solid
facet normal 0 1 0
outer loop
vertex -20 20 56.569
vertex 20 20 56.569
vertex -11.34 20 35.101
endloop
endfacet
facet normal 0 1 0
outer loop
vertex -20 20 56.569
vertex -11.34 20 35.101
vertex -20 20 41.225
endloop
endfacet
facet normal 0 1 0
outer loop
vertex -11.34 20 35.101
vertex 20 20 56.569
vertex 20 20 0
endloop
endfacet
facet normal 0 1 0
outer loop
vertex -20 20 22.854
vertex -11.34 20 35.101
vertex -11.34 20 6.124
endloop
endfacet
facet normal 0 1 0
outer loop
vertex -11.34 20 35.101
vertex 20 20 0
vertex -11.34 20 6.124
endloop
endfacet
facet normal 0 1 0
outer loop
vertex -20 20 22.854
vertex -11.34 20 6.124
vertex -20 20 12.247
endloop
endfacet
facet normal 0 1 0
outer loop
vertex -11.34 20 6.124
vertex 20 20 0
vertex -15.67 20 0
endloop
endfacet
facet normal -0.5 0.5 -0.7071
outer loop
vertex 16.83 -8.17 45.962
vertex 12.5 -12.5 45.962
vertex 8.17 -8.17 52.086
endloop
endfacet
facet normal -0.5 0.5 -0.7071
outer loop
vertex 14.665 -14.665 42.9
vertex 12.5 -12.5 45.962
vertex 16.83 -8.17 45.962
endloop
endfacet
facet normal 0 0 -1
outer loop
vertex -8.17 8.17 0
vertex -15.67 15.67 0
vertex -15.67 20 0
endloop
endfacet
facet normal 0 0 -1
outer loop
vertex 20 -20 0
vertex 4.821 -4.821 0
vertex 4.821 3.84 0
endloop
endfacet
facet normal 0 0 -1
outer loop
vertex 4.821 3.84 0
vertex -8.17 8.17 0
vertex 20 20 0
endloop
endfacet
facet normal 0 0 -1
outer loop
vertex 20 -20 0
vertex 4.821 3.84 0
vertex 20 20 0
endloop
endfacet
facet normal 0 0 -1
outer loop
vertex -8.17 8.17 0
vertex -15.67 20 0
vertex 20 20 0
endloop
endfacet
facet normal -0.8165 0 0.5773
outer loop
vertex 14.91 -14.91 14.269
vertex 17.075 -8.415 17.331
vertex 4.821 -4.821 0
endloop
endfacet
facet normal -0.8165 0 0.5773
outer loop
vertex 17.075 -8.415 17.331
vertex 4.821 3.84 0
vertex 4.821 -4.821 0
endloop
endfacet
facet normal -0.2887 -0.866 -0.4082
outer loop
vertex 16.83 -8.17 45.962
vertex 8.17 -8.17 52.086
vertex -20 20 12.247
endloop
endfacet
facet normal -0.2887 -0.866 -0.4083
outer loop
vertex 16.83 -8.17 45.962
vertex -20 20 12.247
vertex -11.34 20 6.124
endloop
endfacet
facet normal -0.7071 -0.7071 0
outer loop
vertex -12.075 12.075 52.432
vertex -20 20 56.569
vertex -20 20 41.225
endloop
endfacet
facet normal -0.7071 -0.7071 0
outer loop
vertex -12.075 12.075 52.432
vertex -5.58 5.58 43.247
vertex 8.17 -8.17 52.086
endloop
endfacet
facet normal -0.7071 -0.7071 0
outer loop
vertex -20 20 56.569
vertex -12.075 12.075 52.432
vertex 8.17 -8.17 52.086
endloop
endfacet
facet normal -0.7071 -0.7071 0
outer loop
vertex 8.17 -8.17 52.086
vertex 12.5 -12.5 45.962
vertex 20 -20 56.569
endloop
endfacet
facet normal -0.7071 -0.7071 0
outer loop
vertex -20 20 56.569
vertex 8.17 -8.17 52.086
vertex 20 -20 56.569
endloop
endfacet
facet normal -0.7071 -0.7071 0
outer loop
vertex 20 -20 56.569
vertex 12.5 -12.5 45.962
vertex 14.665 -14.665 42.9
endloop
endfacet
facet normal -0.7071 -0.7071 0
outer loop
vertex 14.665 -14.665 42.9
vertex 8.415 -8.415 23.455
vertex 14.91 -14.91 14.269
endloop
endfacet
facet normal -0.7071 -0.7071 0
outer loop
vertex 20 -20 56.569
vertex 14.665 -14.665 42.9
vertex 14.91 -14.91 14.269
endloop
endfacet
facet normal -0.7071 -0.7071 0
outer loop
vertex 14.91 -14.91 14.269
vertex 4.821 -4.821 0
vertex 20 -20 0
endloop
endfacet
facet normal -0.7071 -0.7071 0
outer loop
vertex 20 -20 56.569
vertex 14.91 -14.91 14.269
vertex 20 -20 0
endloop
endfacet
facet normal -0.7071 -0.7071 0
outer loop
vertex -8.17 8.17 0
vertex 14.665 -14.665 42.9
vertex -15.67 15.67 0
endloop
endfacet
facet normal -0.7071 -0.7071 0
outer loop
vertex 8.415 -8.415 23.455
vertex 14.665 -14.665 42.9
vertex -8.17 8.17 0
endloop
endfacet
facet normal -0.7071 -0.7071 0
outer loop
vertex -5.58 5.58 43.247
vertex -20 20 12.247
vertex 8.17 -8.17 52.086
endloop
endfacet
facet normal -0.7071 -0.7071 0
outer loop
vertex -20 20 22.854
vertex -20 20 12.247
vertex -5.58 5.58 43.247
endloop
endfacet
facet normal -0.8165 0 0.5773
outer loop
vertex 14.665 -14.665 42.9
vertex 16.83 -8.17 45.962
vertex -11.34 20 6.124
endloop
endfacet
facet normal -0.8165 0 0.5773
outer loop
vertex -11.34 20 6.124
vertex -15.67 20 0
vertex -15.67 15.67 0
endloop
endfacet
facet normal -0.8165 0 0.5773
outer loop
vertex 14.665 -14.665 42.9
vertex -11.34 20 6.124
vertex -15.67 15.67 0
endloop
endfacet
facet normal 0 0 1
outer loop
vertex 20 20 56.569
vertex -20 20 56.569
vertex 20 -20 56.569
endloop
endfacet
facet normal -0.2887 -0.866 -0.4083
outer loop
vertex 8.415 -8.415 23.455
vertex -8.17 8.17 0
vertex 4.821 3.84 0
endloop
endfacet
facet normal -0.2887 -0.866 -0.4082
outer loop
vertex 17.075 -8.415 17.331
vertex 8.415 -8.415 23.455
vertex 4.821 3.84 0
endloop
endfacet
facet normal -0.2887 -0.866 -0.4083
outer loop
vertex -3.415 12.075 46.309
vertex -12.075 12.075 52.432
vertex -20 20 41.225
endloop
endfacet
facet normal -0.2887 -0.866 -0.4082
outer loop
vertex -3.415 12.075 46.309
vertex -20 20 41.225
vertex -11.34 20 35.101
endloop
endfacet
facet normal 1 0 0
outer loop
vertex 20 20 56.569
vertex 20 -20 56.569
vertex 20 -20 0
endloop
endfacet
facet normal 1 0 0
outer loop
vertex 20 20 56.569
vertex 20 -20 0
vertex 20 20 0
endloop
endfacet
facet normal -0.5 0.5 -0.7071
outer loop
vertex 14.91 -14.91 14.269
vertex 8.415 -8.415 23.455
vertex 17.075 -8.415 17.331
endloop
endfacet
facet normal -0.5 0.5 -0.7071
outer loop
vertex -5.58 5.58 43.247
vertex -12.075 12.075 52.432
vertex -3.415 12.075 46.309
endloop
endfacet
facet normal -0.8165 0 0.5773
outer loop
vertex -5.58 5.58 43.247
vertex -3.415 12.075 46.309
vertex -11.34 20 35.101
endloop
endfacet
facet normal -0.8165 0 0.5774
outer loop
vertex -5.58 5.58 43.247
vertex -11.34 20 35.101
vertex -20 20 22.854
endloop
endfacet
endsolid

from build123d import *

# Parameters (mm, degrees)
F1_DEPTH      = 56.5685424949
F6_DEPTH      = 50
F6_DEPTH_BACK = 5
F7_DEPTH      = 25
F7_DEPTH_BACK = 50


with BuildPart() as f1:
    # F0 (on Top) → F1 (new body)
    with BuildSketch(Plane.XY):
        Polygon((20, -20), (20, 20), (-20, 20), align=None)
    extrude(amount=F1_DEPTH)

    # F4 (on face) → F6 (cut, two sides)
    with BuildSketch(Plane(origin=(10, -10, 14.1421356237), x_dir=(0.8660254038, 0.2886751346, -0.4082482905), z_dir=(-0.5, 0.5, -0.7071067812))) as f6_sk:
        Polygon((-20.8771324027, -29.5247237874), (-28.3771324027, -40.1313255052), (-18.3771324027, -36.5957915992), align=None)
        Polygon((2.7831216351, 3.9359283621), (-4.7168783649, -6.6706733557), (5.2831216351, -3.1351394497), align=None)
    extrude(amount=F6_DEPTH, mode=Mode.SUBTRACT)
    extrude(f6_sk.sketch, amount=-F6_DEPTH_BACK, mode=Mode.SUBTRACT)

    # F4 (on face) → F7 (cut, two sides)
    with BuildSketch(Plane(origin=(10, -10, 14.1421356237), x_dir=(0.8660254038, 0.2886751346, -0.4082482905), z_dir=(-0.5, 0.5, -0.7071067812))) as f7_sk:
        Polygon((-11.5470053838, -16.3299316186), (-16.5470053838, -23.4009994304), (-6.5470053838, -19.8654655245), (-9.0470053838, -12.7943977126), align=None)
    extrude(amount=-F7_DEPTH, mode=Mode.SUBTRACT)
    extrude(f7_sk.sketch, amount=F7_DEPTH_BACK, mode=Mode.SUBTRACT)


solid = f1.part
